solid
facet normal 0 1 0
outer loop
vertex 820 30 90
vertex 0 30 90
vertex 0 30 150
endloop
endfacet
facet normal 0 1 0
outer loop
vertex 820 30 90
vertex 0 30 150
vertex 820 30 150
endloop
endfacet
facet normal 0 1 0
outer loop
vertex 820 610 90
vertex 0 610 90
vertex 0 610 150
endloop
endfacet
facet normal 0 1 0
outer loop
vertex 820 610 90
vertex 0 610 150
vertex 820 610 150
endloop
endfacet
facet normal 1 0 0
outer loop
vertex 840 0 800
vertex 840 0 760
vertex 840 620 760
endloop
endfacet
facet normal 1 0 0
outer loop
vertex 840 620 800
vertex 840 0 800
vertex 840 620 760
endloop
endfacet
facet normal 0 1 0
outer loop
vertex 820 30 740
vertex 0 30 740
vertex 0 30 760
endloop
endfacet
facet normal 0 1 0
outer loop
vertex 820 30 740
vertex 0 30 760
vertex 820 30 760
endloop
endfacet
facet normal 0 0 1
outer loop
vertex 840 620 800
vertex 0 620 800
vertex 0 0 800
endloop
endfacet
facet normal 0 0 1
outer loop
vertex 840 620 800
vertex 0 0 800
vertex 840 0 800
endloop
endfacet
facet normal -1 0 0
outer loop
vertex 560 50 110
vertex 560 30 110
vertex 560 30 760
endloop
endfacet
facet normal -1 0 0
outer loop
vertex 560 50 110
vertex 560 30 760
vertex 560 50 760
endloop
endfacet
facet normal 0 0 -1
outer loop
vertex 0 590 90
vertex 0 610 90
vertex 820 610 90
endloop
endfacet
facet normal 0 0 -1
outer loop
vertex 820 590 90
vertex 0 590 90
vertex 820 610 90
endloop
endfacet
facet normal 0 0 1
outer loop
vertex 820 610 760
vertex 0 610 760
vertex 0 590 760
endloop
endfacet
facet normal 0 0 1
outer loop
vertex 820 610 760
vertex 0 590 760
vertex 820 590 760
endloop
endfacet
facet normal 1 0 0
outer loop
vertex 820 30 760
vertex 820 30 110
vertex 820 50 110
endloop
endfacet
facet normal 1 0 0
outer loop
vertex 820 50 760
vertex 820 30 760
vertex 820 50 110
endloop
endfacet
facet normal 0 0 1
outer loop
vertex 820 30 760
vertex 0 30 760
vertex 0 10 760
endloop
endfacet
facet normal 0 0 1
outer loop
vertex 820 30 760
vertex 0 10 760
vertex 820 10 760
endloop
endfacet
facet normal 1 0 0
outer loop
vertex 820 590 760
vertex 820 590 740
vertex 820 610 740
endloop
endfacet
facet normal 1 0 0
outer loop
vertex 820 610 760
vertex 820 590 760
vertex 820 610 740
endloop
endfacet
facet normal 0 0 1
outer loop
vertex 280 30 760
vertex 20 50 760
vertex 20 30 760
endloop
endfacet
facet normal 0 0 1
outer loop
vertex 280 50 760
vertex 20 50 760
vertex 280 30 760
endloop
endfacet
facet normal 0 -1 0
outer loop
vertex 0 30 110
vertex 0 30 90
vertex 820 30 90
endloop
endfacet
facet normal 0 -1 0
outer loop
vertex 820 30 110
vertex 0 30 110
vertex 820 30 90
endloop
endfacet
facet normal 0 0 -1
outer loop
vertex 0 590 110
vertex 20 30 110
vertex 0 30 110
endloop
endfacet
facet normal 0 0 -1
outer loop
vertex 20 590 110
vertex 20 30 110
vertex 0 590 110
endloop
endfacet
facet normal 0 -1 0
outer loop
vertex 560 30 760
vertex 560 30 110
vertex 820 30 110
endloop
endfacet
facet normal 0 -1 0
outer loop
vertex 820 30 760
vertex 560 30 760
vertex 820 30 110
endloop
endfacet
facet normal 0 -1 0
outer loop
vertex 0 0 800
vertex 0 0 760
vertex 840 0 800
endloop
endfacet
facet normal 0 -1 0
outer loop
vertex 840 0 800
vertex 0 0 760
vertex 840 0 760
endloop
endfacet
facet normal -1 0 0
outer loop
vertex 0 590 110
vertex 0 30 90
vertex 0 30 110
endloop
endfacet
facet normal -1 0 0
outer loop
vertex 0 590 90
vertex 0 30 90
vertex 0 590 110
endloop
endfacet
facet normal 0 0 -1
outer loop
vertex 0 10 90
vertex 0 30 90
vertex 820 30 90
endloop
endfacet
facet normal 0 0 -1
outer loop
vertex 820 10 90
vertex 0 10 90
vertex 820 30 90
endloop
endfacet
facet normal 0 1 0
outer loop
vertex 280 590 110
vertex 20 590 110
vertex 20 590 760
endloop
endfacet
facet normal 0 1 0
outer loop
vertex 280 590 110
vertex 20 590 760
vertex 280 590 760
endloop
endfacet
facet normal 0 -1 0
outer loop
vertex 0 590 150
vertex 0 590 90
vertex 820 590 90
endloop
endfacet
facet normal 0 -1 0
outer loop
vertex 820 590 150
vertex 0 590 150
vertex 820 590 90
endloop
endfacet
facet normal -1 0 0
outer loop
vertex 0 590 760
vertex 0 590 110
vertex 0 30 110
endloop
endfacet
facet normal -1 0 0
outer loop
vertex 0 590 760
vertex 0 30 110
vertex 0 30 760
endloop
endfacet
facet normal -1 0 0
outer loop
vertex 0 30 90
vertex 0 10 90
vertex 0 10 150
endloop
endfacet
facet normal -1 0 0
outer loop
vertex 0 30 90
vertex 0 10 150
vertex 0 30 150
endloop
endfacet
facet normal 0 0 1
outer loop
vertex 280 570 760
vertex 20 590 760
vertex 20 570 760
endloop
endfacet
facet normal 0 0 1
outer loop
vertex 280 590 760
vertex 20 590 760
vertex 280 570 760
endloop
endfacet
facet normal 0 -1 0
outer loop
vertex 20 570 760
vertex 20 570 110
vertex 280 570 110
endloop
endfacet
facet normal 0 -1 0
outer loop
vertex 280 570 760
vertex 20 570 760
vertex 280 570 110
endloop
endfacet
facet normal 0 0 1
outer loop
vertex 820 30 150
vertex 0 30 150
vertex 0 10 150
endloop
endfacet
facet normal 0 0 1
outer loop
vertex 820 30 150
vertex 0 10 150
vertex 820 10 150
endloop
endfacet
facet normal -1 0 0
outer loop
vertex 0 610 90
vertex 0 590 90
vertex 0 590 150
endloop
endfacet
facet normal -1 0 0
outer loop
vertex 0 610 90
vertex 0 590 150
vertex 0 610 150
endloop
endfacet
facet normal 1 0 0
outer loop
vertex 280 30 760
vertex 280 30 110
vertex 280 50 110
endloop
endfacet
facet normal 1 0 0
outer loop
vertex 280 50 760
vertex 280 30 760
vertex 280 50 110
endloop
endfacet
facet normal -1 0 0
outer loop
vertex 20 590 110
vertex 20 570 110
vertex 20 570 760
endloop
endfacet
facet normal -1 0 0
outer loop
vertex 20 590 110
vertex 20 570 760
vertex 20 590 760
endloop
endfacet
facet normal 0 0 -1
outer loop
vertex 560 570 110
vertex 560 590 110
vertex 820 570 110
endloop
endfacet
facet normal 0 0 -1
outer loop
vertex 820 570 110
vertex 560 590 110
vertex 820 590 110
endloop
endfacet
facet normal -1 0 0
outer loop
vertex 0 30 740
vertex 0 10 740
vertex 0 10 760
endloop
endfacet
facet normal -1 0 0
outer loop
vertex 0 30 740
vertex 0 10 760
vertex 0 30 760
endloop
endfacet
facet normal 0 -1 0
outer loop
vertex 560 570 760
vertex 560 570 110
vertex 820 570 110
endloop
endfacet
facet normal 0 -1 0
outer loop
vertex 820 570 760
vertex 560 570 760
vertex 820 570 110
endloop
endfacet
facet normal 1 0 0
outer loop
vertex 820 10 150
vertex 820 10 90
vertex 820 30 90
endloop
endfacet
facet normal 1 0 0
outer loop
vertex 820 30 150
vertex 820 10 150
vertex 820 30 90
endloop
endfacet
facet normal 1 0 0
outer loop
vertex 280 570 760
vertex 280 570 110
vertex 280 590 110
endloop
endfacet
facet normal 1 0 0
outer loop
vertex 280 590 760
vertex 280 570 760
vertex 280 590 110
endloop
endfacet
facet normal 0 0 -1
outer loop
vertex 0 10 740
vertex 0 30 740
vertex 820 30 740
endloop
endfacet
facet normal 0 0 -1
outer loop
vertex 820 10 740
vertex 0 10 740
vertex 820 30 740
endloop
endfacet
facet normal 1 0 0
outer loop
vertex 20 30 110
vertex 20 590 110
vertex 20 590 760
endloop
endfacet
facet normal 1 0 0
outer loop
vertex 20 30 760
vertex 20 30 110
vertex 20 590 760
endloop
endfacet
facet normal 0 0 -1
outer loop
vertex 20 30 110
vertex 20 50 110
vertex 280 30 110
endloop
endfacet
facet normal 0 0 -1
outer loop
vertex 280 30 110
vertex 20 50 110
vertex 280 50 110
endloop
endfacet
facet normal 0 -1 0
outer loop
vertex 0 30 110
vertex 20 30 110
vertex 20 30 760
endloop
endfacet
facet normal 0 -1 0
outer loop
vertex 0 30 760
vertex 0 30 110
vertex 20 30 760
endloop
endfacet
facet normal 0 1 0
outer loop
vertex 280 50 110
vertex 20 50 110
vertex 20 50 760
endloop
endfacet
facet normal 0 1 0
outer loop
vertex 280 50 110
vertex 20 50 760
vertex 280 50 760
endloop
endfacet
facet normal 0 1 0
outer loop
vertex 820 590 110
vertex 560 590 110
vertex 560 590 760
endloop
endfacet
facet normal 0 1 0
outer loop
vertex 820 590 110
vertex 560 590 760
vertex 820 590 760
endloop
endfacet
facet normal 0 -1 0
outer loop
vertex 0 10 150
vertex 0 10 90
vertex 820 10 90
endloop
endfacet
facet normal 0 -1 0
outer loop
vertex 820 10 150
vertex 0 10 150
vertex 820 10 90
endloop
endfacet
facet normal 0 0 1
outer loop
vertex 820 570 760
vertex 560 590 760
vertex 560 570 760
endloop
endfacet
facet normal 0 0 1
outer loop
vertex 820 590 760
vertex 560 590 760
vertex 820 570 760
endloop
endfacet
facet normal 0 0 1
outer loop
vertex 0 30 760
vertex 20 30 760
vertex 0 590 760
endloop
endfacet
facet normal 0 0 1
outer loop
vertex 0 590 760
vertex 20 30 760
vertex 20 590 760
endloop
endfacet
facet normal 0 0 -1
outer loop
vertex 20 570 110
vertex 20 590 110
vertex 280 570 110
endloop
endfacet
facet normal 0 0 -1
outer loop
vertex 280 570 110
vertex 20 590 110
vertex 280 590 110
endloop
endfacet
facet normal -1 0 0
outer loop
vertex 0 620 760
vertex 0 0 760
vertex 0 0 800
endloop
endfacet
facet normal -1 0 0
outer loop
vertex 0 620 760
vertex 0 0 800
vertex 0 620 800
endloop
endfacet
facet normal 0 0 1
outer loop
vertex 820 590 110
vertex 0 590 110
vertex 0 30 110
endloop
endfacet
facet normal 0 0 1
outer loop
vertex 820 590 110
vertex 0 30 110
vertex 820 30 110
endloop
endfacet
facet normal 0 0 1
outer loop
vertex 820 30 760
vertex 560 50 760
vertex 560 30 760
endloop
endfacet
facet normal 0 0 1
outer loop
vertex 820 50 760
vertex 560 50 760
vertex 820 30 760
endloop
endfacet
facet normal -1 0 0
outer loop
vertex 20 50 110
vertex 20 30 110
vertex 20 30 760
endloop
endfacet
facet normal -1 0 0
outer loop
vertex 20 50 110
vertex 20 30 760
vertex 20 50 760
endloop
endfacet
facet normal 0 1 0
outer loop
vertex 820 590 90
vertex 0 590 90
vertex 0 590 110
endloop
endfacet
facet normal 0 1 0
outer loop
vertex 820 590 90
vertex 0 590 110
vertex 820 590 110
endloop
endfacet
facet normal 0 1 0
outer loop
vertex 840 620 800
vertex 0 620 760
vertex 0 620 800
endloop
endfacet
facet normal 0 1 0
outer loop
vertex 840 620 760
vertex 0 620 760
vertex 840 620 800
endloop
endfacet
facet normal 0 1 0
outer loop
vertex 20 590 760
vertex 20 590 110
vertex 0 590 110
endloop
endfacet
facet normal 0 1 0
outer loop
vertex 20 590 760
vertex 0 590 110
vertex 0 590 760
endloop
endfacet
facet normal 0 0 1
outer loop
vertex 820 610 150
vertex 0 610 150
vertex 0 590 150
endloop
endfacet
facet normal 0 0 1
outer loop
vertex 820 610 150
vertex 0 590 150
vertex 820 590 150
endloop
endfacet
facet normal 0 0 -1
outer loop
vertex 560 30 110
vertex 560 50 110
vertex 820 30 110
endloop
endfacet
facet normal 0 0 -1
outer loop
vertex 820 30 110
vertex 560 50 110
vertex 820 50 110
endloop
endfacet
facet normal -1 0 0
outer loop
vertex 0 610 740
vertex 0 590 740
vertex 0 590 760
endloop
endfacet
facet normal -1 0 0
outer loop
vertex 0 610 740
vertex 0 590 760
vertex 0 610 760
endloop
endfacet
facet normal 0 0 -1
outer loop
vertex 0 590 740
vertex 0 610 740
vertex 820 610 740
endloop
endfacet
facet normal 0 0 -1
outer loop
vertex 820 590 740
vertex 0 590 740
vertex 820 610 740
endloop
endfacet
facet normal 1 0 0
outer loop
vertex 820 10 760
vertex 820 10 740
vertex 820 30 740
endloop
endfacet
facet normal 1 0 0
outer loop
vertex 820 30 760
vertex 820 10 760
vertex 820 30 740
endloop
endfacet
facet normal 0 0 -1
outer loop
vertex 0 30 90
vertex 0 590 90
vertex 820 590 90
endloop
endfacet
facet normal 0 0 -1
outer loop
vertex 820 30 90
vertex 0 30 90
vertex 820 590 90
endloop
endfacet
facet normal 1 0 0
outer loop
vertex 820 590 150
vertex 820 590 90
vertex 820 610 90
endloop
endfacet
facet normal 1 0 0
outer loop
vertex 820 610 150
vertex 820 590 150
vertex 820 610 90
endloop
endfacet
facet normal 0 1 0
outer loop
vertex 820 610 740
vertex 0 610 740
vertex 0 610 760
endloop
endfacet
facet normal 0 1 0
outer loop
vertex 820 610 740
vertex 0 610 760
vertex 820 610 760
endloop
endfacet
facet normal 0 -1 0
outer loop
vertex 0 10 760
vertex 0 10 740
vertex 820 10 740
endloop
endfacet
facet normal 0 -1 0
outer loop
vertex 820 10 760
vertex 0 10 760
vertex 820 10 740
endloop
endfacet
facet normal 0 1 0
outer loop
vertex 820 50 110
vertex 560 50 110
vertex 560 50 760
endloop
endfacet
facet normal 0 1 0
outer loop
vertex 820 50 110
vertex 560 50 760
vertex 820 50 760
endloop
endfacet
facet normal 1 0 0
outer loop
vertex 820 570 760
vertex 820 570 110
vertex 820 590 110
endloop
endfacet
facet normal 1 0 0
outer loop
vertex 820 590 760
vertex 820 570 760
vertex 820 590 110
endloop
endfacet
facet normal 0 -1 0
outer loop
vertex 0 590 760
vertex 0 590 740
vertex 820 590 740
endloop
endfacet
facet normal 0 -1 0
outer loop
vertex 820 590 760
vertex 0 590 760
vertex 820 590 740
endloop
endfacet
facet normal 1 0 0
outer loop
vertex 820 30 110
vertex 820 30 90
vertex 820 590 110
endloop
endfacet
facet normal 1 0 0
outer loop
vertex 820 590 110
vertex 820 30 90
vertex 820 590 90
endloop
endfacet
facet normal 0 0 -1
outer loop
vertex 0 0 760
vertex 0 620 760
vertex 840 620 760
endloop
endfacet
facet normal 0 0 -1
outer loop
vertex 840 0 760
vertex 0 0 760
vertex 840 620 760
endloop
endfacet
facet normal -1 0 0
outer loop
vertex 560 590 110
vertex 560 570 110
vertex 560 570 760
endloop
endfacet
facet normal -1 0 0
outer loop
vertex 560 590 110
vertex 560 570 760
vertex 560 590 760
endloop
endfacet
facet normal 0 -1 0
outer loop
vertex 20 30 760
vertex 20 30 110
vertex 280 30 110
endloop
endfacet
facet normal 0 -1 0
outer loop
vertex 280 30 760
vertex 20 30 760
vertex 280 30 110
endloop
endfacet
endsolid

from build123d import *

# Parameters (mm, degrees)
BOX_W        = 840
BOX_H        = 620
BOX_DEPTH    = 40
BOX001_W     = 650
BOX001_H     = 560
BOX001_DEPTH = 20
BOX002_W     = 820
BOX002_H     = 560
BOX002_DEPTH = 20
BOX003_W     = 260
BOX003_H     = 20
BOX003_DEPTH = 650
BOX004_W     = 260
BOX004_H     = 20
BOX004_DEPTH = 650
BOX005_W     = 260
BOX005_H     = 20
BOX005_DEPTH = 650
BOX006_W     = 260
BOX006_H     = 20
BOX006_DEPTH = 650
BOX007_W     = 820
BOX007_H     = 20
BOX007_DEPTH = 60
BOX008_W     = 820
BOX008_H     = 20
BOX008_DEPTH = 60
BOX009_W     = 820
BOX009_H     = 20
BOX009_DEPTH = 20
BOX010_W     = 820
BOX010_H     = 20
BOX010_DEPTH = 20


with BuildPart() as top:
    # Box → Box (new body)
    with BuildSketch(Plane.XY.offset(760)):
        with Locations((420, 310)):
            Rectangle(BOX_W, BOX_H)
    extrude(amount=BOX_DEPTH)


with BuildPart() as rear:
    # Box001 → Box001 (new body)
    with BuildSketch(Plane(origin=(20, 30, 110), x_dir=(0, 0, 1), z_dir=(-1, 0, 0))):
        with Locations((325, 280)):
            Rectangle(BOX001_W, BOX001_H)
    extrude(amount=BOX001_DEPTH)


with BuildPart() as bottom:
    # Box002 → Box002 (new body)
    with BuildSketch(Plane(origin=(0, 30, 90), x_dir=(1, 0, 0), z_dir=(0, 0, 1))):
        with Locations((410, 280)):
            Rectangle(BOX002_W, BOX002_H)
    extrude(amount=BOX002_DEPTH)


with BuildPart() as side_rl:
    # Box003 → Box003 (new body)
    with BuildSketch(Plane(origin=(20, 30, 110), x_dir=(1, 0, 0), z_dir=(0, 0, 1))):
        with Locations((130, 10)):
            Rectangle(BOX003_W, BOX003_H)
    extrude(amount=BOX003_DEPTH)


with BuildPart() as side_rr:
    # Box004 → Box004 (new body)
    with BuildSketch(Plane(origin=(20, 570, 110), x_dir=(1, 0, 0), z_dir=(0, 0, 1))):
        with Locations((130, 10)):
            Rectangle(BOX004_W, BOX004_H)
    extrude(amount=BOX004_DEPTH)


with BuildPart() as side_fl:
    # Box005 → Box005 (new body)
    with BuildSketch(Plane(origin=(560, 30, 110), x_dir=(1, 0, 0), z_dir=(0, 0, 1))):
        with Locations((130, 10)):
            Rectangle(BOX005_W, BOX005_H)
    extrude(amount=BOX005_DEPTH)


with BuildPart() as side_fr:
    # Box006 → Box006 (new body)
    with BuildSketch(Plane(origin=(560, 570, 110), x_dir=(1, 0, 0), z_dir=(0, 0, 1))):
        with Locations((130, 10)):
            Rectangle(BOX006_W, BOX006_H)
    extrude(amount=BOX006_DEPTH)


with BuildPart() as plinth_l:
    # Box007 → Box007 (new body)
    with BuildSketch(Plane(origin=(0, 10, 90), x_dir=(1, 0, 0), z_dir=(0, 0, 1))):
        with Locations((410, 10)):
            Rectangle(BOX007_W, BOX007_H)
    extrude(amount=BOX007_DEPTH)


with BuildPart() as plinth_r:
    # Box008 → Box008 (new body)
    with BuildSketch(Plane(origin=(0, 590, 90), x_dir=(1, 0, 0), z_dir=(0, 0, 1))):
        with Locations((410, 10)):
            Rectangle(BOX008_W, BOX008_H)
    extrude(amount=BOX008_DEPTH)


with BuildPart() as fixing_l:
    # Box009 → Box009 (new body)
    with BuildSketch(Plane(origin=(0, 10, 740), x_dir=(1, 0, 0), z_dir=(0, 0, 1))):
        with Locations((410, 10)):
            Rectangle(BOX009_W, BOX009_H)
    extrude(amount=BOX009_DEPTH)


with BuildPart() as fixing_r:
    # Box010 → Box010 (new body)
    with BuildSketch(Plane(origin=(0, 590, 740), x_dir=(1, 0, 0), z_dir=(0, 0, 1))):
        with Locations((410, 10)):
            Rectangle(BOX010_W, BOX010_H)
    extrude(amount=BOX010_DEPTH)


solid = Compound([top.part, rear.part, bottom.part, side_rl.part, side_rr.part, side_fl.part, side_fr.part, plinth_l.part, plinth_r.part, fixing_l.part, fixing_r.part])
